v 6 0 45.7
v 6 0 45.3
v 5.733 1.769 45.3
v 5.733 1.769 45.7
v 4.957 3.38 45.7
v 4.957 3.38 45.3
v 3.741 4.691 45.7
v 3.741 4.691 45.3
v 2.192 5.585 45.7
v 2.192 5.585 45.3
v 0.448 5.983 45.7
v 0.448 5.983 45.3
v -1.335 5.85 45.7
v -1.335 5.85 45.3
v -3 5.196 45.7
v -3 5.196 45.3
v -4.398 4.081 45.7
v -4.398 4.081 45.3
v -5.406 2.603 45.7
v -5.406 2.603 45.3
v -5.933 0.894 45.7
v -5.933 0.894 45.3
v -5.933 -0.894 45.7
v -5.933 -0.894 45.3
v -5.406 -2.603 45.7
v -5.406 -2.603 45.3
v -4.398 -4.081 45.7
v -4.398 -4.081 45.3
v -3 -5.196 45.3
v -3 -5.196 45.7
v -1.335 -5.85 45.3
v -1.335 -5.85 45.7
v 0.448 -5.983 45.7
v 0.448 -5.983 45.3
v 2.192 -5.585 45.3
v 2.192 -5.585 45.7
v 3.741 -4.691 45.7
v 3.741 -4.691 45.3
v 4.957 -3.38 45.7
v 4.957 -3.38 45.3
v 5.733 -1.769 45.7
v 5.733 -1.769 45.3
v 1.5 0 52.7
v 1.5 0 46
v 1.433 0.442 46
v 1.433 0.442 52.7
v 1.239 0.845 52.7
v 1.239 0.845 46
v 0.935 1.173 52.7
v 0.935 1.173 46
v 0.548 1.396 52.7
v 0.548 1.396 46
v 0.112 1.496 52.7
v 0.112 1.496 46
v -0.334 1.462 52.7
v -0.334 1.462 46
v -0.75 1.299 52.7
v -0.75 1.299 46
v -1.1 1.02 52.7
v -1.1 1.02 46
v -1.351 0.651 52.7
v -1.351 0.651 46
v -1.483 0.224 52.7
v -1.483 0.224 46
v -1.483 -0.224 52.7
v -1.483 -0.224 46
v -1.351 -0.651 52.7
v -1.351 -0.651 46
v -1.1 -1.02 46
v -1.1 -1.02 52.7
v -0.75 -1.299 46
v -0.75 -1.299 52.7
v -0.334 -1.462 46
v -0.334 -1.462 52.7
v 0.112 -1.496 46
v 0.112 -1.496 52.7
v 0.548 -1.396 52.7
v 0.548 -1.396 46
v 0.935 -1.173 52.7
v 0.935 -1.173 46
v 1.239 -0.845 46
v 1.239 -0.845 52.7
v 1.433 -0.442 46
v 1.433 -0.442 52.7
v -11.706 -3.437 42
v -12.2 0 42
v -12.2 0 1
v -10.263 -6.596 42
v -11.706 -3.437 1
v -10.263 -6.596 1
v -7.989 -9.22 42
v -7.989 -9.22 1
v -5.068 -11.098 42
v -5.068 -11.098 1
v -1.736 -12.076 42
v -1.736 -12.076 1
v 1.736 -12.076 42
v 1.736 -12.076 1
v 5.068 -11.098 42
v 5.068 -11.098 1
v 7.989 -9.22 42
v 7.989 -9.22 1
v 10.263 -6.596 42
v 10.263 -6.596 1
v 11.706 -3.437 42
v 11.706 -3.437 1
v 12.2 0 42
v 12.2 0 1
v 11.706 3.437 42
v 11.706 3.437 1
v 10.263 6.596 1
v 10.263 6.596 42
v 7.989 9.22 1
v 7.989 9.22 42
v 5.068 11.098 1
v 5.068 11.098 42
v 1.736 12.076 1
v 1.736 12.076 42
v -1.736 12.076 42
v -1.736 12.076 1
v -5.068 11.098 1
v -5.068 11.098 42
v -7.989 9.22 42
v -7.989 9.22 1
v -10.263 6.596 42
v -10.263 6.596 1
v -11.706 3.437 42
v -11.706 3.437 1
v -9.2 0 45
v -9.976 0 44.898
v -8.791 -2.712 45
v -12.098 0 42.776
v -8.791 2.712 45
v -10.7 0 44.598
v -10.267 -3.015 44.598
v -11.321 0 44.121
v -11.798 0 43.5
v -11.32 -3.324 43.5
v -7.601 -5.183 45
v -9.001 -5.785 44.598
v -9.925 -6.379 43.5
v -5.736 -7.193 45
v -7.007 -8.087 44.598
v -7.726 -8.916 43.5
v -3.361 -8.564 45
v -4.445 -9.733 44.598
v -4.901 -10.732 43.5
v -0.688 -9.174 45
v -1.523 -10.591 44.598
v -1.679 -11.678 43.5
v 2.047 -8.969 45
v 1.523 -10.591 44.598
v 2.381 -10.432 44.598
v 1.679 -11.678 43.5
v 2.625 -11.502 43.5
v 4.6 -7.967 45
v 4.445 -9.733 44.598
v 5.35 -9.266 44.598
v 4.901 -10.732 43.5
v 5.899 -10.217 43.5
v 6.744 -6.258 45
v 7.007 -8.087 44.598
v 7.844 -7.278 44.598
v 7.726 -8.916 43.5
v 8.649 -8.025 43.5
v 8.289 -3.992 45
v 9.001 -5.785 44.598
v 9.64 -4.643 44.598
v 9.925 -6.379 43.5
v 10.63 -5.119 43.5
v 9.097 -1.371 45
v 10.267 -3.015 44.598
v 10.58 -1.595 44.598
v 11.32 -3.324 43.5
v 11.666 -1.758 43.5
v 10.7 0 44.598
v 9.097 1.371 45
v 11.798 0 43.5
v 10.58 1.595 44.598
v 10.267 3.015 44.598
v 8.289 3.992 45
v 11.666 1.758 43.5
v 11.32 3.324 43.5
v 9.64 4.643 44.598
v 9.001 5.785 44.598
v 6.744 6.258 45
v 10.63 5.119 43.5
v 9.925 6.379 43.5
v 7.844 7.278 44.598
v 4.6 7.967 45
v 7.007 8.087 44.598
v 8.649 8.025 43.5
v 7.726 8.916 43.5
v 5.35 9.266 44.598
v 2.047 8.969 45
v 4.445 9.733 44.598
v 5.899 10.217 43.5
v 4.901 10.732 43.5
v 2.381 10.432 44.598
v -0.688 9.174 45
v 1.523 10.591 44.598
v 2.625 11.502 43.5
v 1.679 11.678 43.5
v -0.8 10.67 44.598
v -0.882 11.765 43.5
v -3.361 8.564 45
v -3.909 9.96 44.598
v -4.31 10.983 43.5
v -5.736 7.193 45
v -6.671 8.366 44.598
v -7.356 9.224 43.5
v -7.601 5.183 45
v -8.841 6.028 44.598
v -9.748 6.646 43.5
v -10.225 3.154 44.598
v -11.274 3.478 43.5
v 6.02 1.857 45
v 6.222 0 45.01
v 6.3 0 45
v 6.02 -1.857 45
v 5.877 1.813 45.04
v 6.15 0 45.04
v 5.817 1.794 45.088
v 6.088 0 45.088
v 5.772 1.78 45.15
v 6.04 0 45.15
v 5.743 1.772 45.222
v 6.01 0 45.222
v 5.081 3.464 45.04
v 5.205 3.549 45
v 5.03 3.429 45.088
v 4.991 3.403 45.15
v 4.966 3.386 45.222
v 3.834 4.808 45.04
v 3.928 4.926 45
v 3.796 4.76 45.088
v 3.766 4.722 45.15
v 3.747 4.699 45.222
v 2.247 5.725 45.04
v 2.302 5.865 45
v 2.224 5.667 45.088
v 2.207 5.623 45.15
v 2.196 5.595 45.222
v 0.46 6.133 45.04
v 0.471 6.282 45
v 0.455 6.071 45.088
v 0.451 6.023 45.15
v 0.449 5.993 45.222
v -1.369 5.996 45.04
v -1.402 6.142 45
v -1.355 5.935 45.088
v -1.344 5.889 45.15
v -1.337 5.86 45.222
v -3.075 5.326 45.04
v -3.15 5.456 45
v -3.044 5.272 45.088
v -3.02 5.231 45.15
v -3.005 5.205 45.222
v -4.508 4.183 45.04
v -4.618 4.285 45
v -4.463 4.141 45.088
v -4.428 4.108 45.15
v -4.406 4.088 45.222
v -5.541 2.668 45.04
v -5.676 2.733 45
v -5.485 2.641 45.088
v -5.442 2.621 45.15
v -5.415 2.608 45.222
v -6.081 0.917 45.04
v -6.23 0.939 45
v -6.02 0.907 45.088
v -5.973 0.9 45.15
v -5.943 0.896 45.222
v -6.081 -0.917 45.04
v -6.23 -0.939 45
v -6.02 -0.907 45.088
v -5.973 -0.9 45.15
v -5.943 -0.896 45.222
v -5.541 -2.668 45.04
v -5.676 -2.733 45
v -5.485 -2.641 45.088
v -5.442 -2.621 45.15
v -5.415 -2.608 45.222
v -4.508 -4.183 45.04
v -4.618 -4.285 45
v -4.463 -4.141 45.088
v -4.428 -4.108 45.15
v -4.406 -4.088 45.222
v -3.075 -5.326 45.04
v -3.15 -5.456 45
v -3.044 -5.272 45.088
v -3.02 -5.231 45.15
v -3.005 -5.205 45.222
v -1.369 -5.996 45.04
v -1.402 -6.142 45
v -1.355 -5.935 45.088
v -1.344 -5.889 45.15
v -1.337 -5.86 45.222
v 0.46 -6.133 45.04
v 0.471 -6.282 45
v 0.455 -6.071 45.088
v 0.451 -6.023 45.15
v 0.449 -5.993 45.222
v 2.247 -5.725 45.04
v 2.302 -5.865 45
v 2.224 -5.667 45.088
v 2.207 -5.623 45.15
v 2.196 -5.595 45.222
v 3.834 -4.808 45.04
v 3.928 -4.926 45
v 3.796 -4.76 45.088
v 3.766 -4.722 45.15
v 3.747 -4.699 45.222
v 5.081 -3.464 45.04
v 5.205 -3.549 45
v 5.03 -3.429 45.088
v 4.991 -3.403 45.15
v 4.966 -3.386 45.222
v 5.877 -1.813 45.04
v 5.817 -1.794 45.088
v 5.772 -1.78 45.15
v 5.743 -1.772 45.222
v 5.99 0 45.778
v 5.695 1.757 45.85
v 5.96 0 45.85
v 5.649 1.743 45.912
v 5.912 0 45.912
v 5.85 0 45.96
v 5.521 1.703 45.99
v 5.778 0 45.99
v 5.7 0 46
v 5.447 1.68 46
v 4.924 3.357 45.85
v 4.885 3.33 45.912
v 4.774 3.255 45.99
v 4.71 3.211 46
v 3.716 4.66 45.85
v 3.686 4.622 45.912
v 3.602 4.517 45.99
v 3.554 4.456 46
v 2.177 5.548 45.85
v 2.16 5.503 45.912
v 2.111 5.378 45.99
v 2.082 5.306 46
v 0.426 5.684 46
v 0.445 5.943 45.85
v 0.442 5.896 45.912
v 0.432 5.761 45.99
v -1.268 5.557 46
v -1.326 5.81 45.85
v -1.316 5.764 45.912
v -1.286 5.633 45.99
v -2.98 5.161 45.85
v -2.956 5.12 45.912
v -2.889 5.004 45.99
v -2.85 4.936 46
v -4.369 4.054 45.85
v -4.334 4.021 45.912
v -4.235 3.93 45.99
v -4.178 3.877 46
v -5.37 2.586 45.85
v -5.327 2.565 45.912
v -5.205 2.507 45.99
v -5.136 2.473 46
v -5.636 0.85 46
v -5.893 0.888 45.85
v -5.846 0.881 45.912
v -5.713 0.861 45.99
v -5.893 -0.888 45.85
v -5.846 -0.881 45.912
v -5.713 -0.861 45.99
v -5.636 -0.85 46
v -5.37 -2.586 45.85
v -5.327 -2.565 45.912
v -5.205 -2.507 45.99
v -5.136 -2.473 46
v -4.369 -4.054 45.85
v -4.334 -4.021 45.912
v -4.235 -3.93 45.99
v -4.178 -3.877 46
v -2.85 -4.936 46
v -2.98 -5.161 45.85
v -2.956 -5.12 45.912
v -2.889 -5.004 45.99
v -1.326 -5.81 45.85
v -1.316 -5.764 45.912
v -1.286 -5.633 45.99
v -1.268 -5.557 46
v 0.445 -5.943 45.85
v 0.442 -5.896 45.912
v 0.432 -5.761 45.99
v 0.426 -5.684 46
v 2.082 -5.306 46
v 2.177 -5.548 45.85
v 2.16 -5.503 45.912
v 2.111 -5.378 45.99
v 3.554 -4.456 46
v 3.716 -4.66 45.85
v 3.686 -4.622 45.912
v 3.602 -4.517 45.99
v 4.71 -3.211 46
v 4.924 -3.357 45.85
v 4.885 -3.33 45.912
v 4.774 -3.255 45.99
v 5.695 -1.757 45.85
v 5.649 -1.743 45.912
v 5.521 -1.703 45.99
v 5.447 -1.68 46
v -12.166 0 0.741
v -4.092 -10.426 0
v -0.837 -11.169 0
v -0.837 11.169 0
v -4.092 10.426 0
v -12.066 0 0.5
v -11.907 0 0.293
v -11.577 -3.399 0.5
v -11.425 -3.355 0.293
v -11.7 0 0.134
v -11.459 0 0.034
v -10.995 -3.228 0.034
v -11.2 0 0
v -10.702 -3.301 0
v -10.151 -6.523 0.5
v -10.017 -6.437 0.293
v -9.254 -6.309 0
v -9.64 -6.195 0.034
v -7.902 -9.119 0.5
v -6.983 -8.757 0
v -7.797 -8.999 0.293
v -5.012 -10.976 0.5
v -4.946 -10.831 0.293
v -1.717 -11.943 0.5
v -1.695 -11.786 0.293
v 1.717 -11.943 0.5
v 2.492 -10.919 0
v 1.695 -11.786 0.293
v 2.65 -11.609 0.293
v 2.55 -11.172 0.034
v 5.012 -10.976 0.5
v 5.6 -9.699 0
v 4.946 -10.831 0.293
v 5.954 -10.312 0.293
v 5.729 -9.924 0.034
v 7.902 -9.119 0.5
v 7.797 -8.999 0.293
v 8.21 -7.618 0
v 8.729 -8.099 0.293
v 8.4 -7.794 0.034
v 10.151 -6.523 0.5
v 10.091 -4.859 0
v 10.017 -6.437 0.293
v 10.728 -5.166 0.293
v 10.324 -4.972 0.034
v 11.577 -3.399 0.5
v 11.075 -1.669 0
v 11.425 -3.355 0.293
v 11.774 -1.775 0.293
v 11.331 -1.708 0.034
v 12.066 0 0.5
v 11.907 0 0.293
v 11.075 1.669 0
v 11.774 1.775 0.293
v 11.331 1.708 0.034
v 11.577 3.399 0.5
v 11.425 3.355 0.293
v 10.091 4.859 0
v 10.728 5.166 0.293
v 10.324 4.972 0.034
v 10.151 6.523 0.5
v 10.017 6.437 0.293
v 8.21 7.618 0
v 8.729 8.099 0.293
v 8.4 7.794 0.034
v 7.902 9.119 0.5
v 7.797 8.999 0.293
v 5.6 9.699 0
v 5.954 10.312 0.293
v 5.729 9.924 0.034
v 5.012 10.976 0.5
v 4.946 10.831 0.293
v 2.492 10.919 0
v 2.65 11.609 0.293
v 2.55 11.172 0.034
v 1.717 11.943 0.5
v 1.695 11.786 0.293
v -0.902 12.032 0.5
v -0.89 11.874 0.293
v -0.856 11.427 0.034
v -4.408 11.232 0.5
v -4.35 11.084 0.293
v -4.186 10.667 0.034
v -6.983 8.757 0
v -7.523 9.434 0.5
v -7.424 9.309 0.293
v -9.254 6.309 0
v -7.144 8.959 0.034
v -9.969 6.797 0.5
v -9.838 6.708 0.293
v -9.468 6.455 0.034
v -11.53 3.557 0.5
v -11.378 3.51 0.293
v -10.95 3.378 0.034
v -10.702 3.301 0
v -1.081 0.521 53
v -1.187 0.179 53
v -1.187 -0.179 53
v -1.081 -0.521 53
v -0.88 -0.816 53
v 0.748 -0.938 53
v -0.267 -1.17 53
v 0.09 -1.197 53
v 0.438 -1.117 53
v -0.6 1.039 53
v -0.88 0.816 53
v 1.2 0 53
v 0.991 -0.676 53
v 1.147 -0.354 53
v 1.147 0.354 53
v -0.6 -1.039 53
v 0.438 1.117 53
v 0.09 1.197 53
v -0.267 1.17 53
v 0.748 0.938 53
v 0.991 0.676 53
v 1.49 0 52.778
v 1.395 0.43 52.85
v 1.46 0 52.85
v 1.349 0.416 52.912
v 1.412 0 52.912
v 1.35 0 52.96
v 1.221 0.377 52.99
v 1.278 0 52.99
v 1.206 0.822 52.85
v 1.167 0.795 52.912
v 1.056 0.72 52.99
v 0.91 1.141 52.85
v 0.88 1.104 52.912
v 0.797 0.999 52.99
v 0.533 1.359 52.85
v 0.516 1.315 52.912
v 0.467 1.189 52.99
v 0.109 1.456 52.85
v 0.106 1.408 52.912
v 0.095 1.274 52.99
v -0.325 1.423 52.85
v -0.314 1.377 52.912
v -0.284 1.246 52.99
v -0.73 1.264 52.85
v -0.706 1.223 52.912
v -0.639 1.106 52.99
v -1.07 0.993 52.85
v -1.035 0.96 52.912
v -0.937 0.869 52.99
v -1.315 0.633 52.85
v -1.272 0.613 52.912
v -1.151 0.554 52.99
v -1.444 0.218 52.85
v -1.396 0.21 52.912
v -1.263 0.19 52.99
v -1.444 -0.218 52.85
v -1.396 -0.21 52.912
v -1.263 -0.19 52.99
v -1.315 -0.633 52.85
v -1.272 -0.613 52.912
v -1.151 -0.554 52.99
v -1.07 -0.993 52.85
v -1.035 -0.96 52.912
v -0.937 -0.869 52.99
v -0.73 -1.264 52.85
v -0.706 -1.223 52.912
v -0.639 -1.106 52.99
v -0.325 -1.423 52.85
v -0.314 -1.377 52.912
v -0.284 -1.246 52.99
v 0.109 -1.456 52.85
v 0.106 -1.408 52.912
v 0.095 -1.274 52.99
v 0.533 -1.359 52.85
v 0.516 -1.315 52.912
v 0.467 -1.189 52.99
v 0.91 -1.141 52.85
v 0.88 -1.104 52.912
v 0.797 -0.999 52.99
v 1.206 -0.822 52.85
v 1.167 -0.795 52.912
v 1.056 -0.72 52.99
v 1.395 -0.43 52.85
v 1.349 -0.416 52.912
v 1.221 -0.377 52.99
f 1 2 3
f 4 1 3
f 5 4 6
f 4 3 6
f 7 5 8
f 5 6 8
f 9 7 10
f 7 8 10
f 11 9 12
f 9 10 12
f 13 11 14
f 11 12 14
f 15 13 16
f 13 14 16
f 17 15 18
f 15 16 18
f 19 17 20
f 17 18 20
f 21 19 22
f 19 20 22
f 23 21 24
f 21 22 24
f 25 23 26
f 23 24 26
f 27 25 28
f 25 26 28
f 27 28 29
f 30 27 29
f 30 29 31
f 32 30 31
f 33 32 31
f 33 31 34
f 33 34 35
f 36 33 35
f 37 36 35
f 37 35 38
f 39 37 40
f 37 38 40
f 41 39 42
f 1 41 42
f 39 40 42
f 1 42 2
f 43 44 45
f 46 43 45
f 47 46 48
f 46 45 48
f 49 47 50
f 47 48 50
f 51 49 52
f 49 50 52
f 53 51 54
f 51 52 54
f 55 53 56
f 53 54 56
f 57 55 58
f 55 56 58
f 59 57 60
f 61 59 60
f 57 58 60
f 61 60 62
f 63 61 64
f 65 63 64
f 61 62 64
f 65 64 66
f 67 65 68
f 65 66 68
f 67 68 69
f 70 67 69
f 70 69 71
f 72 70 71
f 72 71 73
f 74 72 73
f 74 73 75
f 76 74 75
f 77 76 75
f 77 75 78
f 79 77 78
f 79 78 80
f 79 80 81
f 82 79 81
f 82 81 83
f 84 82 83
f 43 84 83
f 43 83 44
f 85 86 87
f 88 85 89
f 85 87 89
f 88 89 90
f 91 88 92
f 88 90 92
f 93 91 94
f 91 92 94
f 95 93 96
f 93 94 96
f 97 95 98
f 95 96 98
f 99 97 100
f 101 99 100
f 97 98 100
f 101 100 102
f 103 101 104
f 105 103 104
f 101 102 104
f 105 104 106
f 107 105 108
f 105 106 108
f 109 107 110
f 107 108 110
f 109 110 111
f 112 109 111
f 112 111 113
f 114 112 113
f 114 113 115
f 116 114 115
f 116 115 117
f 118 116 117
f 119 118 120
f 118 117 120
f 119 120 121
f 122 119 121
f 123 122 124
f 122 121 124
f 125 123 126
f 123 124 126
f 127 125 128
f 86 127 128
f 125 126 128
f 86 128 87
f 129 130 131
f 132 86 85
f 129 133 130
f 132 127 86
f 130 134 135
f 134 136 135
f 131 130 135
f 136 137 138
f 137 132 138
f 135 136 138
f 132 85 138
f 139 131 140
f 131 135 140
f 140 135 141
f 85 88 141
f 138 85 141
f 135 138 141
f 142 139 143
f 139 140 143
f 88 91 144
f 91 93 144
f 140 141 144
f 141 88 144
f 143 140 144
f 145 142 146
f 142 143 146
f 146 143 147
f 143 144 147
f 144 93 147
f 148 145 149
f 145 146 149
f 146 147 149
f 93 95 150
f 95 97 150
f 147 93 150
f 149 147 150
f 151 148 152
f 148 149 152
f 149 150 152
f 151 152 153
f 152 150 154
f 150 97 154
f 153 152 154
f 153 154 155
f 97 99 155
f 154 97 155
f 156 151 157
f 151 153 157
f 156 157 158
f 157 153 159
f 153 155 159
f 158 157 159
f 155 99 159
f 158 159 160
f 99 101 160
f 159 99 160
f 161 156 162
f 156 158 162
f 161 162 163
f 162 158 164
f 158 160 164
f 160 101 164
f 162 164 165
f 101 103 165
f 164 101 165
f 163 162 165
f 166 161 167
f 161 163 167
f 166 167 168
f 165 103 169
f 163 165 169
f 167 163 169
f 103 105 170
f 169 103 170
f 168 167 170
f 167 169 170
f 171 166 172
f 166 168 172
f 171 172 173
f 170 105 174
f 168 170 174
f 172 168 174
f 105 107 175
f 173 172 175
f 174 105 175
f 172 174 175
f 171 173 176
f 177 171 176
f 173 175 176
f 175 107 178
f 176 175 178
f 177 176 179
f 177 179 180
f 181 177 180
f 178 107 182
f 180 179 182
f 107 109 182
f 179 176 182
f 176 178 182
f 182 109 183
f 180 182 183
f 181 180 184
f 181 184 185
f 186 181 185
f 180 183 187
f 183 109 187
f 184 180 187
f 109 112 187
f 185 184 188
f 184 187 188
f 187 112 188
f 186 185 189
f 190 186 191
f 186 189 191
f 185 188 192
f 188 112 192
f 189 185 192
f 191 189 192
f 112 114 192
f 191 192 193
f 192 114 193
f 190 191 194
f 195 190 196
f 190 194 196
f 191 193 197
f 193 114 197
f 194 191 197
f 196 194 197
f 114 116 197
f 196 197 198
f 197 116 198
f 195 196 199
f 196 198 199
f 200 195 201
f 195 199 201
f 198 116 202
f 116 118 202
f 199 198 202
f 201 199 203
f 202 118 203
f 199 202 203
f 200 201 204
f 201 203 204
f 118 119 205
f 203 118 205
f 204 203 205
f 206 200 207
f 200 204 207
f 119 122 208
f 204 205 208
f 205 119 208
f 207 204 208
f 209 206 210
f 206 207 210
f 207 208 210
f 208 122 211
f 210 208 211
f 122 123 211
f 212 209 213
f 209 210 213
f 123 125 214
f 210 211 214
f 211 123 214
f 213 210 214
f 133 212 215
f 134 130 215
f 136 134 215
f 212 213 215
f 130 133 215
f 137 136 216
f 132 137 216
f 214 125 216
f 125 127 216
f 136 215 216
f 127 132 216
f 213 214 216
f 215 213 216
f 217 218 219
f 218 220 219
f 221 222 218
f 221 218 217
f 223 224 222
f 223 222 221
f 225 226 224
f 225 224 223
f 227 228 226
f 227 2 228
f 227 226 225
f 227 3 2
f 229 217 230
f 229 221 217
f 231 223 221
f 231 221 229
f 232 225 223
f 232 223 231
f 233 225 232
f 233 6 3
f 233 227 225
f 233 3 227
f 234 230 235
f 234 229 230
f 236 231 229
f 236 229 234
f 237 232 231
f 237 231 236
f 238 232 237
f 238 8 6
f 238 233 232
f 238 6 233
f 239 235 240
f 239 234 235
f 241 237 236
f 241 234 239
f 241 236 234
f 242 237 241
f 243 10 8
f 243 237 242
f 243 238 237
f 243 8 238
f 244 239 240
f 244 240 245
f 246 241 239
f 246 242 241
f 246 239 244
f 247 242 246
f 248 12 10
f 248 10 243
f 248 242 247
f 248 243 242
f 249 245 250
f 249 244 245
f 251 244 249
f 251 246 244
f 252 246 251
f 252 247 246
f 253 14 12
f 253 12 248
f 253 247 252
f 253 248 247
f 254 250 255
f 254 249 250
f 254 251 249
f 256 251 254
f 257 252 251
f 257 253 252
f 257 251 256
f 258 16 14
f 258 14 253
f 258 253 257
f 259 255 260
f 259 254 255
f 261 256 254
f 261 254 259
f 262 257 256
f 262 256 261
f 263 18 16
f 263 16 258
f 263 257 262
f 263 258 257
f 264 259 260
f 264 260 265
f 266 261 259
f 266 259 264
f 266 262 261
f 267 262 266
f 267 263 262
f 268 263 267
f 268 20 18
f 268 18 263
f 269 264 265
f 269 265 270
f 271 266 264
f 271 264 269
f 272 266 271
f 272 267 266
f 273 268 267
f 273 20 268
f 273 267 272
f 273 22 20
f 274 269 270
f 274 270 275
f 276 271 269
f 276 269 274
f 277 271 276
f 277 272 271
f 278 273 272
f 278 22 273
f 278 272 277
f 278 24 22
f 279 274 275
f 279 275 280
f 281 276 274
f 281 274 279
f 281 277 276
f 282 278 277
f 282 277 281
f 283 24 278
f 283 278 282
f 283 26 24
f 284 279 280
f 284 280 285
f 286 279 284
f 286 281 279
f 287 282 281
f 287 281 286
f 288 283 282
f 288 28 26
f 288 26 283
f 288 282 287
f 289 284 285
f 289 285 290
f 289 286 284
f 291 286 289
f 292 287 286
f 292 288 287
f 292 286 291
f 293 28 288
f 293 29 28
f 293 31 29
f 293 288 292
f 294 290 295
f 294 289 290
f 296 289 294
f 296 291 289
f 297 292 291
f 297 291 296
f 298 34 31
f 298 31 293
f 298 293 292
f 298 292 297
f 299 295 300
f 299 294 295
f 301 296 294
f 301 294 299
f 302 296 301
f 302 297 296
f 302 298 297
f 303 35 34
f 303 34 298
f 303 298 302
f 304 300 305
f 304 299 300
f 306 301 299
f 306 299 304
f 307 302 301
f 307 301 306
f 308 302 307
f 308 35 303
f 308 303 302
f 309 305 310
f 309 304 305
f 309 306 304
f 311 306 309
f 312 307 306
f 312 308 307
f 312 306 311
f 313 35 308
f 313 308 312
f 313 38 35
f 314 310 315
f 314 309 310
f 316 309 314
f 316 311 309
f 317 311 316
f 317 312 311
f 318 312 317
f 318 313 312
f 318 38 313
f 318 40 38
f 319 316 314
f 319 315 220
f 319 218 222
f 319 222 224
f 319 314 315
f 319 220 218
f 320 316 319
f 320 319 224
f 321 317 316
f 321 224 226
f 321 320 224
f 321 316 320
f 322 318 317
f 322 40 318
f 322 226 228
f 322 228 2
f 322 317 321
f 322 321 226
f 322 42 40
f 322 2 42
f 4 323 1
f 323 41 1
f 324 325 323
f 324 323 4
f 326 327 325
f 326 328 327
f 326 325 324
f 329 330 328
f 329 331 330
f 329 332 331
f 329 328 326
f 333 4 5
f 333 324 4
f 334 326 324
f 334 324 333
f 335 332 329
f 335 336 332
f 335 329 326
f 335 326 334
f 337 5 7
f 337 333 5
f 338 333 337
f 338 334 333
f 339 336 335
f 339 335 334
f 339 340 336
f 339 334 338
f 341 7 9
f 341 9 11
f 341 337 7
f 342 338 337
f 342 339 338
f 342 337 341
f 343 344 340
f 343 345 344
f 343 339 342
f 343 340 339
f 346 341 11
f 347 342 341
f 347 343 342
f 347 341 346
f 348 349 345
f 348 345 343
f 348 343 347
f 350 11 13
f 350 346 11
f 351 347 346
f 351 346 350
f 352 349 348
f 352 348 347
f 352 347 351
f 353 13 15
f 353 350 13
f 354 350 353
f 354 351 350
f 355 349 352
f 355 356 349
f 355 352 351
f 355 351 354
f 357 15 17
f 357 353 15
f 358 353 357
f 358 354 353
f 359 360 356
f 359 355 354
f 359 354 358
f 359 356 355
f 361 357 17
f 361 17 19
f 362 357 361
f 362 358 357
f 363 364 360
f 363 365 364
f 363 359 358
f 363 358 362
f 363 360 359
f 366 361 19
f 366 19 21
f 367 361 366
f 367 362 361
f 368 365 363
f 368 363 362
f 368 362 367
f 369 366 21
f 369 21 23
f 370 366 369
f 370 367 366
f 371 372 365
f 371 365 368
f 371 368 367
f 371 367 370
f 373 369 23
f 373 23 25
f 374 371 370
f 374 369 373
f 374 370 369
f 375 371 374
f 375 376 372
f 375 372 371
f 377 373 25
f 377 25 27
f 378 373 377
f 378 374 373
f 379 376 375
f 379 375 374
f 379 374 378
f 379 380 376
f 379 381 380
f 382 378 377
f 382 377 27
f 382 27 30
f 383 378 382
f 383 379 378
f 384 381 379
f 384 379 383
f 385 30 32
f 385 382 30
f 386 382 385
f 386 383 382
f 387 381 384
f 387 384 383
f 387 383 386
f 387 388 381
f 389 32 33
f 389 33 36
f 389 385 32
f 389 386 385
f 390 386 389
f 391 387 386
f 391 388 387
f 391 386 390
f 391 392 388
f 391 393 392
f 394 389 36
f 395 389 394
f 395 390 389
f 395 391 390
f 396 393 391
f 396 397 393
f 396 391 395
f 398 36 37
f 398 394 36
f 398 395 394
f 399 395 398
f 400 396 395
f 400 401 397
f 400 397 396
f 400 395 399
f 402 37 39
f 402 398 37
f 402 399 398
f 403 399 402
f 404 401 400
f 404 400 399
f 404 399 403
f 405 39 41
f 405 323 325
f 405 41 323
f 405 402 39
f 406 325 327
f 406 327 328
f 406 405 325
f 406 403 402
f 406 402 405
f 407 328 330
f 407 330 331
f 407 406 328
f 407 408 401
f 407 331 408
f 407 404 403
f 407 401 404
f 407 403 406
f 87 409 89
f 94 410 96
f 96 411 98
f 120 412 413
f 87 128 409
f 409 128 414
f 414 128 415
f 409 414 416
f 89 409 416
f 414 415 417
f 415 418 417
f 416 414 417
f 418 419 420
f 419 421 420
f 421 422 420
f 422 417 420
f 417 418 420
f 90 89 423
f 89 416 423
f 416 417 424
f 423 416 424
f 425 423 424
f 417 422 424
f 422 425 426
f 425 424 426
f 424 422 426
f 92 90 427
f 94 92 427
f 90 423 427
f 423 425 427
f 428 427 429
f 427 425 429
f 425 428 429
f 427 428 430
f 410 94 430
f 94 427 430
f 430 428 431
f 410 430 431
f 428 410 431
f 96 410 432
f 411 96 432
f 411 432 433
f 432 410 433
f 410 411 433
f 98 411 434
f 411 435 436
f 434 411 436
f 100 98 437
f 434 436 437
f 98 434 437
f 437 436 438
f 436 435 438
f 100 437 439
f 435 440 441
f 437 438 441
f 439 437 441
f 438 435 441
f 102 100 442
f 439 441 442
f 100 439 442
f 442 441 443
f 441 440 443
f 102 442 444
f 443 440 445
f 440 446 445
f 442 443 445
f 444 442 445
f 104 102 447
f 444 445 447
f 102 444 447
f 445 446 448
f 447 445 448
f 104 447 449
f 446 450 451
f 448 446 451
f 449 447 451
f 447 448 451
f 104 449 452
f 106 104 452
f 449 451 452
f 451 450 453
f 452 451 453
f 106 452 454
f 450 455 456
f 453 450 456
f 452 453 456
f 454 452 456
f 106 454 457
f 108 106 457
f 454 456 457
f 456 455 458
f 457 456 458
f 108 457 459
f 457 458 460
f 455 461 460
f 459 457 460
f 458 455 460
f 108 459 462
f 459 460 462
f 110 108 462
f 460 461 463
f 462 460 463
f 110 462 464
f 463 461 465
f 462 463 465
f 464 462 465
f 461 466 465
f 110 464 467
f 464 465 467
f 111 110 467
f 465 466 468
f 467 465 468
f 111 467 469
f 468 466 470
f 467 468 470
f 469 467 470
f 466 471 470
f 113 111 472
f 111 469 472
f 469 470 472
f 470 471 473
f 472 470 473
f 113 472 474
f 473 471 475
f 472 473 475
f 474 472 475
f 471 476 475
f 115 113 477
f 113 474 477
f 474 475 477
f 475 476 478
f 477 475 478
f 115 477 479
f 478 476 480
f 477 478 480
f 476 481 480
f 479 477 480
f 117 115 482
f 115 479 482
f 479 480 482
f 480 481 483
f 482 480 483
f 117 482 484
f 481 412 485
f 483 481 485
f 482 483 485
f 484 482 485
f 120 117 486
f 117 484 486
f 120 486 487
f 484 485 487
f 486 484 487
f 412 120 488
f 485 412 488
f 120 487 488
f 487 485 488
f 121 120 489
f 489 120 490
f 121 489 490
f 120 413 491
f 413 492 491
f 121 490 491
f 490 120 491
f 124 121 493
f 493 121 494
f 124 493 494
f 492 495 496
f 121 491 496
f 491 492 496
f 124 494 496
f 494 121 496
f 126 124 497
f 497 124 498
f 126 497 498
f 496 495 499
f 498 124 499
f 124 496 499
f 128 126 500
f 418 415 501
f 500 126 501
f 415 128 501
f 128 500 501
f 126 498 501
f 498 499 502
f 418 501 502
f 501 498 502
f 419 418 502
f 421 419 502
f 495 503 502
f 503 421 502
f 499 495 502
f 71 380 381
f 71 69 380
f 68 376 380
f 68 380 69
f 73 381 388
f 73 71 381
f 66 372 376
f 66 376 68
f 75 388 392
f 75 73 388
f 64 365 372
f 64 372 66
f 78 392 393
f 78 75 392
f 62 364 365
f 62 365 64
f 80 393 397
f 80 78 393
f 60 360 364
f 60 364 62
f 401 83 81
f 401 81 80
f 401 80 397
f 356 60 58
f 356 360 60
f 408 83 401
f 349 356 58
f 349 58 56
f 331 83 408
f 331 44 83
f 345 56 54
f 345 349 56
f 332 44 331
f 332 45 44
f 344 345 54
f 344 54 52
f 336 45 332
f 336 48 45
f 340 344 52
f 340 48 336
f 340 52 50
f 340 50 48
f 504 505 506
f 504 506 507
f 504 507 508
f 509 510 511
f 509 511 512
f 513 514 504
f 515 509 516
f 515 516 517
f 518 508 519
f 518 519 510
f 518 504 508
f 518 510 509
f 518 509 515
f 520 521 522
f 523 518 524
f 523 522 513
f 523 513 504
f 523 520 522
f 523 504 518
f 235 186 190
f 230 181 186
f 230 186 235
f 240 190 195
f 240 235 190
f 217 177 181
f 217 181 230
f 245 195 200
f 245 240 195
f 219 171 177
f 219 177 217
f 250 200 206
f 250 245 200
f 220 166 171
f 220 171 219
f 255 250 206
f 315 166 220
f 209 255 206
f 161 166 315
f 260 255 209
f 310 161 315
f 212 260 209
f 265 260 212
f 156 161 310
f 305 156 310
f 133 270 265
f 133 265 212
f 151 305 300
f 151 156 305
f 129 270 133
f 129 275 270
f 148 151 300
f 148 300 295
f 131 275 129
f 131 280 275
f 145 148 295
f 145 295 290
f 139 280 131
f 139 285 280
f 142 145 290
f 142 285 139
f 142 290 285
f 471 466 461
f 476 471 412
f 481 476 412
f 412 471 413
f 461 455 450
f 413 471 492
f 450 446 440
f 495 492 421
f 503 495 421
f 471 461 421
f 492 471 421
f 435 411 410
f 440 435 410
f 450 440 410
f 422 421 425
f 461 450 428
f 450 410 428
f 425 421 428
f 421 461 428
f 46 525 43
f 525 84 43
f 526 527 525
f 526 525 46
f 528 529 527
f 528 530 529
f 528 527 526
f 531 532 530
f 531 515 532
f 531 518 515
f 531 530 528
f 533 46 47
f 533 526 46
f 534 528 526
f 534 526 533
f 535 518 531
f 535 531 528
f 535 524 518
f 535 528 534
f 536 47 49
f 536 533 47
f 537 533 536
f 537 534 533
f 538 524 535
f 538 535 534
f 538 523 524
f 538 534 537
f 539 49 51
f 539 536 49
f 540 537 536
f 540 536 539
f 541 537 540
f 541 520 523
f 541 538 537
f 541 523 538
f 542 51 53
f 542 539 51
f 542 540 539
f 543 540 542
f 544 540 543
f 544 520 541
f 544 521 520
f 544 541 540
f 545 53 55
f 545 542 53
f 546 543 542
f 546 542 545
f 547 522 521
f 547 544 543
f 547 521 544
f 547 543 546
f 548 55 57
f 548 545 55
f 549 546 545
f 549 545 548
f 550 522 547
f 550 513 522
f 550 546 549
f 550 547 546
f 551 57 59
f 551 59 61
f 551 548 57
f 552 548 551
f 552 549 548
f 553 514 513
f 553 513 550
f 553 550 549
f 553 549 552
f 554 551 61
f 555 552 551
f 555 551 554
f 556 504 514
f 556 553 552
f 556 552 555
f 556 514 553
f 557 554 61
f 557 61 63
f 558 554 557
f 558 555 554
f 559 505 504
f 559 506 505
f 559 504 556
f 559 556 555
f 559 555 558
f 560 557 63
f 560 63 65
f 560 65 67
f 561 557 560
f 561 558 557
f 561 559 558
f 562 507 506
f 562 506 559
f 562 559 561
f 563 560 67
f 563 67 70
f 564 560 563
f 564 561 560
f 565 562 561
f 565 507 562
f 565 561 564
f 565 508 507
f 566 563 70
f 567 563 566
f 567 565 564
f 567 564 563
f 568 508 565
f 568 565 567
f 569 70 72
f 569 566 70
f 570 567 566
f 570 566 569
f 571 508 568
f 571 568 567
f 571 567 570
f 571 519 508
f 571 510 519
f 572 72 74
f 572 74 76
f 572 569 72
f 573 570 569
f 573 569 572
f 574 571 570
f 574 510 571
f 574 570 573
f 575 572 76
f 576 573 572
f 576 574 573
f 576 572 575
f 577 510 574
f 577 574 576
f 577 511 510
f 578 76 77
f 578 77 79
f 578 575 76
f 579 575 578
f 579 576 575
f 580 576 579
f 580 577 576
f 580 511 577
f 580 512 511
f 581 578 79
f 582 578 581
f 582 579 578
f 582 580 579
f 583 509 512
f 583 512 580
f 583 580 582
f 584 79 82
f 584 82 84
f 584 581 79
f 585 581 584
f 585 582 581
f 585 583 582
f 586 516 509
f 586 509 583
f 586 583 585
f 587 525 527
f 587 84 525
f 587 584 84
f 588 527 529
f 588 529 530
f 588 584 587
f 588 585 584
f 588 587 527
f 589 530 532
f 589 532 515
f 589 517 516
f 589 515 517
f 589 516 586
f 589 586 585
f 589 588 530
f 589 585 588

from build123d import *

# Parameters (mm, degrees)
SKETCH1_R           = 12.2
BOSS_EXTRUDE1_DEPTH = 45
SKETCH2_R           = 6
BOSS_EXTRUDE2_DEPTH = 1
SKETCH3_R           = 1.5
BOSS_EXTRUDE3_DEPTH = 8
FILLET1_R           = 3
FILLET2_R           = 1
FILLET3_R           = 0.3
FILLET4_R           = 0.3


with BuildPart() as part:
    # Sketch1 → Boss-Extrude1 (new body)
    with BuildSketch(Plane.XY):
        with Locations(Location((0, 0, 0), (0, 0, 180))):
            Circle(SKETCH1_R)
    extrude(amount=BOSS_EXTRUDE1_DEPTH)

    # Sketch2 → Boss-Extrude2 (add)
    with BuildSketch(Plane.XY.offset(45)):
        Circle(SKETCH2_R)
    extrude(amount=BOSS_EXTRUDE2_DEPTH)

    # Sketch3 → Boss-Extrude3 (add)
    with BuildSketch(Plane.XY.offset(45)):
        Circle(SKETCH3_R)
    extrude(amount=BOSS_EXTRUDE3_DEPTH)

    # Fillet1
    fillet1_edges = [part.edges().sort_by_distance(p)[0] for p in [
        (12.2, 0, 45),
    ]]
    fillet(fillet1_edges, radius=FILLET1_R)

    # Fillet2
    fillet2_edges = [part.edges().sort_by_distance(p)[0] for p in [
        (12.2, 0, 0),
    ]]
    fillet(fillet2_edges, radius=FILLET2_R)

    # Fillet3
    fillet3_edges = [part.edges().sort_by_distance(p)[0] for p in [
        (-6, 0, 45),
        (-6, 0, 46),
    ]]
    fillet(fillet3_edges, radius=FILLET3_R)

    # Fillet4
    fillet4_edges = [part.edges().sort_by_distance(p)[0] for p in [
        (-1.5, 0, 53),
    ]]
    fillet(fillet4_edges, radius=FILLET4_R)


solid = part.part
